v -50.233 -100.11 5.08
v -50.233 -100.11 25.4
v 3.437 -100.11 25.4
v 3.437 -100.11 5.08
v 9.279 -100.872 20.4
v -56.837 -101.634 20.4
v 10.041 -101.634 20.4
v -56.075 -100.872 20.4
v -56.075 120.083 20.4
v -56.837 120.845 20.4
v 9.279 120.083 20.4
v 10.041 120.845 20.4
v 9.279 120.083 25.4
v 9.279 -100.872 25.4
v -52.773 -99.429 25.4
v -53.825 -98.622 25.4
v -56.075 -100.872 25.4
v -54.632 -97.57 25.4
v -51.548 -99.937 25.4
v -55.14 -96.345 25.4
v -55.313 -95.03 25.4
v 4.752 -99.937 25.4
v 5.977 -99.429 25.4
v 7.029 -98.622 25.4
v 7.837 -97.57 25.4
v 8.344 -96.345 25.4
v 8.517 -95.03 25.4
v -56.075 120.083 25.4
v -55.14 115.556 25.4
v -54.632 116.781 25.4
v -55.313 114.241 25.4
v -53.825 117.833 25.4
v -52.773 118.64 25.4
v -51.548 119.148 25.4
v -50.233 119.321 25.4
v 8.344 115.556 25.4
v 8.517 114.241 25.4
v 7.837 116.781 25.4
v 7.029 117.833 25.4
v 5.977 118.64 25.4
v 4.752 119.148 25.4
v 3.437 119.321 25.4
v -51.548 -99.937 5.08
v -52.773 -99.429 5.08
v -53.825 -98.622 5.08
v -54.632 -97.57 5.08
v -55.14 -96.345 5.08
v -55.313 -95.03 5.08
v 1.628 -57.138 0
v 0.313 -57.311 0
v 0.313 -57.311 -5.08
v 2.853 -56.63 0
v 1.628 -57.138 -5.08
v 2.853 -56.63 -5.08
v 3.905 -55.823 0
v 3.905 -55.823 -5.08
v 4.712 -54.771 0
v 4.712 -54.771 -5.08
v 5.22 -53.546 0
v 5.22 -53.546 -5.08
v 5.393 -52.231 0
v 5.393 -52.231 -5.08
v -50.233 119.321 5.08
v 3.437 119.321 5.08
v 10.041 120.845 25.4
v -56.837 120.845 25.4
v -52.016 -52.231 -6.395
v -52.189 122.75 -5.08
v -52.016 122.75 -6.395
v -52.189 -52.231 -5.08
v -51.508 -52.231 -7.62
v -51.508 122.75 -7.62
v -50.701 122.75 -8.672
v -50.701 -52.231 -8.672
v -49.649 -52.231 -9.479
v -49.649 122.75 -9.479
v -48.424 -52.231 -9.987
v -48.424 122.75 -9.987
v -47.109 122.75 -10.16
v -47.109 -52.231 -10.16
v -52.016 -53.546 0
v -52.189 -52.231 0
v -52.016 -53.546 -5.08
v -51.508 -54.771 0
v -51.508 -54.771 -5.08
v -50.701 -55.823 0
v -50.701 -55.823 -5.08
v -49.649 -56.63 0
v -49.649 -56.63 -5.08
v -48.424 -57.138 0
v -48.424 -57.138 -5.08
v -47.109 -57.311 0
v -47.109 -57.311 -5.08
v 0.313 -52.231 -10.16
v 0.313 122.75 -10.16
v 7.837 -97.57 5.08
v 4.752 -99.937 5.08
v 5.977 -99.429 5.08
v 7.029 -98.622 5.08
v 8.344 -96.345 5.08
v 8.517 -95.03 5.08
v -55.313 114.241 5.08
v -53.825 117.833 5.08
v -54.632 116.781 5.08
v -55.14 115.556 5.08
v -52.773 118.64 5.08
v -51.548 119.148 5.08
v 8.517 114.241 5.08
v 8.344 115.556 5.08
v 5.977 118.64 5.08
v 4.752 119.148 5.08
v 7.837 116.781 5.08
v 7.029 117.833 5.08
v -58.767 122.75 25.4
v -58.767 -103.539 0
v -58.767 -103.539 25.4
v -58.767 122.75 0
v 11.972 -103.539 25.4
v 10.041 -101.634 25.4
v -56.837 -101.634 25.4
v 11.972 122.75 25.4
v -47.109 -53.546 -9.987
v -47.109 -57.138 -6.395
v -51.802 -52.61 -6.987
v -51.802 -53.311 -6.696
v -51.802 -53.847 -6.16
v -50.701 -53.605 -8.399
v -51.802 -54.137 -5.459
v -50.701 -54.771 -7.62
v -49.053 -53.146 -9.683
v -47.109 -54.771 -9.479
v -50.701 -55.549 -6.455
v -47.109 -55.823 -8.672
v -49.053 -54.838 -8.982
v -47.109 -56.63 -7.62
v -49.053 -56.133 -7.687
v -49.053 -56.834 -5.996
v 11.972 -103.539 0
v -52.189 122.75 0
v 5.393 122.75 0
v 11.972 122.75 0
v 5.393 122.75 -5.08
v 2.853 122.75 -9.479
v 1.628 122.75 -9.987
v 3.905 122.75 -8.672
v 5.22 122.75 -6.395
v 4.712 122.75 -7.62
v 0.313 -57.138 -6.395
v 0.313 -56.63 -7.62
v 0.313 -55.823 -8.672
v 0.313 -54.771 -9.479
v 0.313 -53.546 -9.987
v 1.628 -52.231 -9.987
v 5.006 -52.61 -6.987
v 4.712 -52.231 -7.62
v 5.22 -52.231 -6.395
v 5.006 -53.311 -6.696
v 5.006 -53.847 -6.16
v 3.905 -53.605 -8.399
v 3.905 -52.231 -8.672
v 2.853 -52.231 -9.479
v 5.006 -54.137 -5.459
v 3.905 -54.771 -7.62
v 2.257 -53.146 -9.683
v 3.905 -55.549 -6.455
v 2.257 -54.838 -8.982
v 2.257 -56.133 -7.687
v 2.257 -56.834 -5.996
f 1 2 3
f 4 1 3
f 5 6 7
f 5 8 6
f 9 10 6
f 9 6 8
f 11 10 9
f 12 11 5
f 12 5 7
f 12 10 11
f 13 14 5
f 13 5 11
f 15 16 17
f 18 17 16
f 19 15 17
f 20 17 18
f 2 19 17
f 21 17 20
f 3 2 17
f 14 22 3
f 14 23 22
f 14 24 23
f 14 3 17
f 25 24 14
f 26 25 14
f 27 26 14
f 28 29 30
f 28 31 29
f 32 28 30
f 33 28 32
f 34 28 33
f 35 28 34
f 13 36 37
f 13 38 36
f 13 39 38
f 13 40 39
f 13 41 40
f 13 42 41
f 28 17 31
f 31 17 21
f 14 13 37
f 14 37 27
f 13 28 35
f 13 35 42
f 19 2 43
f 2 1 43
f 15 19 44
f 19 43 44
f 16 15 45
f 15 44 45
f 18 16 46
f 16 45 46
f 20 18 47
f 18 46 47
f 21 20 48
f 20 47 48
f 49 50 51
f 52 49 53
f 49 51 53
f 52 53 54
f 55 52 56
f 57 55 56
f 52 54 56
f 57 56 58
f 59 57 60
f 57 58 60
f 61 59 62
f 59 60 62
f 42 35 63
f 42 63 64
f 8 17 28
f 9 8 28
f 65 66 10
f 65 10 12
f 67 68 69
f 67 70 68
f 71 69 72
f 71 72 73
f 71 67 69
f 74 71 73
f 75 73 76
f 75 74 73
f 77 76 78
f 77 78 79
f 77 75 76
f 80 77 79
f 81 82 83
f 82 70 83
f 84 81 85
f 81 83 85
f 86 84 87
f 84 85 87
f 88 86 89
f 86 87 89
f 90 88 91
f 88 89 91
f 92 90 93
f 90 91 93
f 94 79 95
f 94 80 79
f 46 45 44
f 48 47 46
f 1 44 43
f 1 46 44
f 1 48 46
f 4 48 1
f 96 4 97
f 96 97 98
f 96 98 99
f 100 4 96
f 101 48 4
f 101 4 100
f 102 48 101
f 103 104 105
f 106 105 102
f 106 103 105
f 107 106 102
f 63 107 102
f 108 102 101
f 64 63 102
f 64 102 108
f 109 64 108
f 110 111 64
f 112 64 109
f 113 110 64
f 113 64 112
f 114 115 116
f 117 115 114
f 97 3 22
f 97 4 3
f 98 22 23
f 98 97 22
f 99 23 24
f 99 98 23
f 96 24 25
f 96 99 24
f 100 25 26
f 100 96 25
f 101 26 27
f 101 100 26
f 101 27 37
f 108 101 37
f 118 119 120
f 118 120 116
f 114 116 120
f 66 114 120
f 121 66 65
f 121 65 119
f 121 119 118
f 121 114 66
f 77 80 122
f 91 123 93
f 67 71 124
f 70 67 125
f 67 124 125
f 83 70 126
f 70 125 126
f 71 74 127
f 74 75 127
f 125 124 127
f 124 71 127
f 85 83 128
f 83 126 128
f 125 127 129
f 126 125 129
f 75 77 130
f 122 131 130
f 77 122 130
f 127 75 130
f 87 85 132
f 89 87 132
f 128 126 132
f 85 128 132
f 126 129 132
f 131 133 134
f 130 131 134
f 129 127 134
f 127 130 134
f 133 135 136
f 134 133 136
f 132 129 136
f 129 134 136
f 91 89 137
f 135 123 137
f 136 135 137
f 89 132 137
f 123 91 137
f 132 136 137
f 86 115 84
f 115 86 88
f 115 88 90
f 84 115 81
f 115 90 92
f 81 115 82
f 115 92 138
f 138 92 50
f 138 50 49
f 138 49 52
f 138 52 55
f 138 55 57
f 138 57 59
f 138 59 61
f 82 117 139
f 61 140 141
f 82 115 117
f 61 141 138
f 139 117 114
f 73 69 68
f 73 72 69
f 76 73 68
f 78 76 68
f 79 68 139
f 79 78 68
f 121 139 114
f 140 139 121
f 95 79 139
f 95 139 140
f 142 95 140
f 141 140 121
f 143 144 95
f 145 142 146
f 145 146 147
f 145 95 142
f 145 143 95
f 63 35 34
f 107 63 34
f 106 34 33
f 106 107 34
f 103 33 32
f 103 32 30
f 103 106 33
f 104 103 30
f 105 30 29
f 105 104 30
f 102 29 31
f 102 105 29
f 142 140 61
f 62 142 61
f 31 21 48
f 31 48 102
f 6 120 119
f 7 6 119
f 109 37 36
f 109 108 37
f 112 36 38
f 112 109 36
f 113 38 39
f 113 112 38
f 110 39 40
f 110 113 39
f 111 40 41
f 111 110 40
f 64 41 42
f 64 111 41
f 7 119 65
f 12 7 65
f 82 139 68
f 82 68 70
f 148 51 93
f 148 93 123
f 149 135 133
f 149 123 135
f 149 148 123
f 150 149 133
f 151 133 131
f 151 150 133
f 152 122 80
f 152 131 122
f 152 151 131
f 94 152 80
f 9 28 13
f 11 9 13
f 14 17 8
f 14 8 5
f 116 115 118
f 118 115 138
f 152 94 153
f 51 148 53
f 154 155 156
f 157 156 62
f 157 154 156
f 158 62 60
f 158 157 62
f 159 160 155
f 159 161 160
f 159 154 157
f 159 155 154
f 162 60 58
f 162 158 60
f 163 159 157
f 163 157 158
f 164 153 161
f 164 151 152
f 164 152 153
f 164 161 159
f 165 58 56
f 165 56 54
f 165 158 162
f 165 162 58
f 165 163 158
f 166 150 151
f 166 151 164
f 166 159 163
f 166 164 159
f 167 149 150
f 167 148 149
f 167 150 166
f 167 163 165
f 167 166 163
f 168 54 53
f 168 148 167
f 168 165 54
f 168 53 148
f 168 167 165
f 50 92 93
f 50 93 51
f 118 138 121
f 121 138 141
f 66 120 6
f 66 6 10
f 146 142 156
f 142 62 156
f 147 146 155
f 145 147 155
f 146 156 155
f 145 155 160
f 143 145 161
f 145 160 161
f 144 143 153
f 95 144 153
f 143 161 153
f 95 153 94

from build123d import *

# Parameters (mm, degrees)
F0_W     = 70.739
F0_H     = 226.2886
F1_DEPTH = 25.4
F2_W     = 63.8302
F2_H     = 219.4306
F3_DEPTH = 20.32
F4_W     = 57.5818
F4_H     = 180.0606
F5_DEPTH = 10.16
F6_R     = 5.08
F7_W     = 66.8782
F7_H     = 222.4786
F7_W_2   = 65.3542
F7_H_2   = 220.9546
F8_DEPTH = 5


with BuildPart() as f1:
    # F0 (on Top) → F1 (new body)
    with BuildSketch(Plane.XY):
        with Locations((-23.397979, 9.605568)):
            Rectangle(F0_W, F0_H)
    extrude(amount=F1_DEPTH)

    # F2 (on face) → F3 (cut)
    with BuildSketch(Plane.XY.offset(25.4)):
        with Locations((-23.397979, 9.605568)):
            Rectangle(F2_W, F2_H)
    extrude(amount=-F3_DEPTH, mode=Mode.SUBTRACT)

    # F4 (on face) → F5 (join)
    with BuildSketch(Plane(origin=(0, 0, 0), x_dir=(1, 0, 0), z_dir=(0, 0, -1))):
        with Locations((-23.397979, -32.719568)):
            Rectangle(F4_W, F4_H)
    extrude(amount=F5_DEPTH)

    # F6
    f6_edges = [f1.edges().sort_by_distance(p)[0] for p in [
        (-23.397979, -57.310732, -10.16),
        (5.392921, 32.719568, -10.16),
        (-52.188879, 32.719568, -10.16),
        (5.392921, -57.310732, -5.08),
        (-52.188879, -57.310732, -5.08),
        (8.517121, -100.109732, 15.24),
        (8.517121, 119.320868, 15.24),
        (-55.313079, 119.320868, 15.24),
        (-55.313079, -100.109732, 15.24),
    ]]
    fillet(f6_edges, radius=F6_R)

    # F7 (on face) → F8 (cut)
    with BuildSketch(Plane.XY.offset(25.4)):
        with Locations((-23.397979, 9.605568)):
            Rectangle(F7_W, F7_H)
        with Locations((-23.397979, 9.605568)):
            Rectangle(F7_W_2, F7_H_2, mode=Mode.SUBTRACT)
    extrude(amount=-F8_DEPTH, mode=Mode.SUBTRACT)


solid = f1.part
